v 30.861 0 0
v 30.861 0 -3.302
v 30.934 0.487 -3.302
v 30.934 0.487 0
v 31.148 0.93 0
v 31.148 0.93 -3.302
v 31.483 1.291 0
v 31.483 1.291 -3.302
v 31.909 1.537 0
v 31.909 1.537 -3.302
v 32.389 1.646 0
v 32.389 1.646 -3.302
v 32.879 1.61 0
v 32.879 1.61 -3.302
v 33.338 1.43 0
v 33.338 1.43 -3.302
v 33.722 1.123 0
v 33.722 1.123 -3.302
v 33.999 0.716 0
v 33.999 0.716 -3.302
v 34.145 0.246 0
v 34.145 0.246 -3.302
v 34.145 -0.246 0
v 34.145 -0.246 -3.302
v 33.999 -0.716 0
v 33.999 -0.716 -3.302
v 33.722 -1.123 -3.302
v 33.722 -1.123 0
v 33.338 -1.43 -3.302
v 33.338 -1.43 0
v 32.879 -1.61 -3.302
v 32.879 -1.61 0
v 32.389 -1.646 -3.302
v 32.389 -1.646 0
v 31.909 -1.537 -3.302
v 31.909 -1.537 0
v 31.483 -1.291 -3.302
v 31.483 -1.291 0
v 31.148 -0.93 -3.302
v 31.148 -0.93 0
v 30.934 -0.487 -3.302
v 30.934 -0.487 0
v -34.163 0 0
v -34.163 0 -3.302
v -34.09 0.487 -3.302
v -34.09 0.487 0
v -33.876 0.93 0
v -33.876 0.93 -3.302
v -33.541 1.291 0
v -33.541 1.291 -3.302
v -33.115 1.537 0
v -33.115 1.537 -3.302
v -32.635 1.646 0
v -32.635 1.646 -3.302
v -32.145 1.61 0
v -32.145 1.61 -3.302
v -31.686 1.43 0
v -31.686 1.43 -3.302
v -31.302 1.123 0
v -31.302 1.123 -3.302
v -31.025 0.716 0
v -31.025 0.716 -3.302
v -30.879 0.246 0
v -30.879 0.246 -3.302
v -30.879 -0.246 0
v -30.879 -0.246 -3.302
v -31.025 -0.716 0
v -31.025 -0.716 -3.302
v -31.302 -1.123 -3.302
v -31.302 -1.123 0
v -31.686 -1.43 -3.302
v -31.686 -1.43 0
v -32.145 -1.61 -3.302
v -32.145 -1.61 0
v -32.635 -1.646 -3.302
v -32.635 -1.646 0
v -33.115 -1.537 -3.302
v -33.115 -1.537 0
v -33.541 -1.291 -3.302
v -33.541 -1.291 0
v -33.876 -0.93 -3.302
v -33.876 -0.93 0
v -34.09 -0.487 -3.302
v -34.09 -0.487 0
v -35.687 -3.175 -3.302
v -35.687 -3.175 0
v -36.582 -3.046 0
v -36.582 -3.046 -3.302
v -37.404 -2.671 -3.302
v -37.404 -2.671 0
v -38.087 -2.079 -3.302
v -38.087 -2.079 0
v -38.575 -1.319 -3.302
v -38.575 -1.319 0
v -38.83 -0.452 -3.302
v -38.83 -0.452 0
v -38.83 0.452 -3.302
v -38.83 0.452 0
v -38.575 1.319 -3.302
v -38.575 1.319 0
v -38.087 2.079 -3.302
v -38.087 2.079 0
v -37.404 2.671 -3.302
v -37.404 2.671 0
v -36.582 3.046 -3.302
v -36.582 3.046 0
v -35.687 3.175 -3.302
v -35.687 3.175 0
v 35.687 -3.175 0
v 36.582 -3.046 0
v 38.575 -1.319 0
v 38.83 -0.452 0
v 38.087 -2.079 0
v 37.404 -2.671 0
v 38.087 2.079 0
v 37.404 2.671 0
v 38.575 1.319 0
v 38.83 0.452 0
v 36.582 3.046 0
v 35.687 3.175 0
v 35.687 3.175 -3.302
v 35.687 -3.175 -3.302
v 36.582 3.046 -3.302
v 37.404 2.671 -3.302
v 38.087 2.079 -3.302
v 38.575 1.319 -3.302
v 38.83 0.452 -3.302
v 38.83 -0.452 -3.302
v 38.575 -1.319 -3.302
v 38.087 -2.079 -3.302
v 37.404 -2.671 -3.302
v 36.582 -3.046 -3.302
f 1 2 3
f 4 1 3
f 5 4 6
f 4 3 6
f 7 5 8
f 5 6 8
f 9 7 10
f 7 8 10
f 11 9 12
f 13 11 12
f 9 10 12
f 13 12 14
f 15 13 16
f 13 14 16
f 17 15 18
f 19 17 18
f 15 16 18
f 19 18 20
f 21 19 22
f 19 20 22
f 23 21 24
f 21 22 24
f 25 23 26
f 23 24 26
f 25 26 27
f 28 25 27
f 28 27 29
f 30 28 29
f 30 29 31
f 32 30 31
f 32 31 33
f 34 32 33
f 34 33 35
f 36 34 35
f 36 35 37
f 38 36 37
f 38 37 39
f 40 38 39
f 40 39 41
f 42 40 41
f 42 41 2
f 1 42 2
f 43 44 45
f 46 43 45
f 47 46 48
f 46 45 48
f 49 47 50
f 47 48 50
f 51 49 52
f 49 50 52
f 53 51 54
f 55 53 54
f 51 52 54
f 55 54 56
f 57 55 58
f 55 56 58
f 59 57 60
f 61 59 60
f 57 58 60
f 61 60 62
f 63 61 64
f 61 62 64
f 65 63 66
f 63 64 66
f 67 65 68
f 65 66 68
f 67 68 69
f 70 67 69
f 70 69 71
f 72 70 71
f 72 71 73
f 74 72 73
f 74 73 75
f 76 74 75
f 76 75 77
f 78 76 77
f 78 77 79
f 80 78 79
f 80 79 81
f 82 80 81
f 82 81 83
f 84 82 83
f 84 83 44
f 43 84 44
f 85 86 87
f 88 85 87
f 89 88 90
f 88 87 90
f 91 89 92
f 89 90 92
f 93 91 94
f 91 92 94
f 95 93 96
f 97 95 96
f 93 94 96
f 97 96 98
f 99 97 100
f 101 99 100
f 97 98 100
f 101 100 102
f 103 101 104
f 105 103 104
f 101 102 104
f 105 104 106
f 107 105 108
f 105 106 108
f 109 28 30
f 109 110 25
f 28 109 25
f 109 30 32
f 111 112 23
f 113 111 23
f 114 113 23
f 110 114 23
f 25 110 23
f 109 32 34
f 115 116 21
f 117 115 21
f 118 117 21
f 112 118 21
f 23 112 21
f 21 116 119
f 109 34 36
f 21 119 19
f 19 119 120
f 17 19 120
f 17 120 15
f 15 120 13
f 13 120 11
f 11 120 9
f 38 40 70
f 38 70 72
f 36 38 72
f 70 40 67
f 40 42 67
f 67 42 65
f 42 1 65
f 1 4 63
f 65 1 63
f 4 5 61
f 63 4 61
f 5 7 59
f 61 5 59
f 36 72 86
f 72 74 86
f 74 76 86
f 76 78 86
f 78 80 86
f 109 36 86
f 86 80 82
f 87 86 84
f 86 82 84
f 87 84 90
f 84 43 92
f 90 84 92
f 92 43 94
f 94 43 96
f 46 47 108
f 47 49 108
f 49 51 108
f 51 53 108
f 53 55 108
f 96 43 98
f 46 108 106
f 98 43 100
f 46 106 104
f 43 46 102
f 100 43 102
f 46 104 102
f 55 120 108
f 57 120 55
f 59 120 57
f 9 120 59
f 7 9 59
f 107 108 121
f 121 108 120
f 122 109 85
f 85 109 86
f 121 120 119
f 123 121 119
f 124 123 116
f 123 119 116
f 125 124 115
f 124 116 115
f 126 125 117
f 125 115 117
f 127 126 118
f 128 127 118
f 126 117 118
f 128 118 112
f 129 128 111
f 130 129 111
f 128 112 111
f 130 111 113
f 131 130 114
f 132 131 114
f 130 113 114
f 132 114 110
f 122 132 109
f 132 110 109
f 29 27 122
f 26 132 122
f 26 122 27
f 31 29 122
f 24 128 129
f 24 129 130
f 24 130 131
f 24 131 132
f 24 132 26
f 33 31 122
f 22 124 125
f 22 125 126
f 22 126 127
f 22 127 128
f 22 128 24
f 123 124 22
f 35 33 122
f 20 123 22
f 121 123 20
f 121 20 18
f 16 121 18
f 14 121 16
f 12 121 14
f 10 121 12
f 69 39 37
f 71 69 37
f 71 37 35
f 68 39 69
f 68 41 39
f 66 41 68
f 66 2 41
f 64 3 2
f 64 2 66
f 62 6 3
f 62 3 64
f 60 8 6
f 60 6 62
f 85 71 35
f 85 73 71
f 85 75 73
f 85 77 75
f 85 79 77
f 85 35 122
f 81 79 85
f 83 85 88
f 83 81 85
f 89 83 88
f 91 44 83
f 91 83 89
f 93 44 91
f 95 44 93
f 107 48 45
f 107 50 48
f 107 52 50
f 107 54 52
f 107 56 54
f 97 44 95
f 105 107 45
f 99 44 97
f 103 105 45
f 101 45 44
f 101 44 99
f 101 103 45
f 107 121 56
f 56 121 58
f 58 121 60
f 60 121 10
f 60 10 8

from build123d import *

# Parameters (mm, degrees)
BOSS_EXTRUDE1_DEPTH         = 3.302
F_1_4_0_13_DIAMETER_HOLE1_D = 3.302


with BuildPart() as part:
    # Sketch1 → Boss-Extrude1 (new body)
    with BuildSketch(Plane.XY):
        with BuildLine():
            Line((35.687, -3.175), (-35.687, -3.175))
            ThreePointArc((-35.687, -3.175), (-38.862, 0), (-35.687, 3.175))
            Line((-35.687, 3.175), (35.687, 3.175))
            ThreePointArc((35.687, 3.175), (38.862, 0), (35.687, -3.175))
        make_face()
    extrude(amount=-BOSS_EXTRUDE1_DEPTH)

    # 1/4 (0.13) Diameter Hole1 (through all)
    with Locations(Plane.XY):
        with Locations((-32.512, 0), (32.512, 0)):
            Hole(F_1_4_0_13_DIAMETER_HOLE1_D / 2)


solid = part.part
